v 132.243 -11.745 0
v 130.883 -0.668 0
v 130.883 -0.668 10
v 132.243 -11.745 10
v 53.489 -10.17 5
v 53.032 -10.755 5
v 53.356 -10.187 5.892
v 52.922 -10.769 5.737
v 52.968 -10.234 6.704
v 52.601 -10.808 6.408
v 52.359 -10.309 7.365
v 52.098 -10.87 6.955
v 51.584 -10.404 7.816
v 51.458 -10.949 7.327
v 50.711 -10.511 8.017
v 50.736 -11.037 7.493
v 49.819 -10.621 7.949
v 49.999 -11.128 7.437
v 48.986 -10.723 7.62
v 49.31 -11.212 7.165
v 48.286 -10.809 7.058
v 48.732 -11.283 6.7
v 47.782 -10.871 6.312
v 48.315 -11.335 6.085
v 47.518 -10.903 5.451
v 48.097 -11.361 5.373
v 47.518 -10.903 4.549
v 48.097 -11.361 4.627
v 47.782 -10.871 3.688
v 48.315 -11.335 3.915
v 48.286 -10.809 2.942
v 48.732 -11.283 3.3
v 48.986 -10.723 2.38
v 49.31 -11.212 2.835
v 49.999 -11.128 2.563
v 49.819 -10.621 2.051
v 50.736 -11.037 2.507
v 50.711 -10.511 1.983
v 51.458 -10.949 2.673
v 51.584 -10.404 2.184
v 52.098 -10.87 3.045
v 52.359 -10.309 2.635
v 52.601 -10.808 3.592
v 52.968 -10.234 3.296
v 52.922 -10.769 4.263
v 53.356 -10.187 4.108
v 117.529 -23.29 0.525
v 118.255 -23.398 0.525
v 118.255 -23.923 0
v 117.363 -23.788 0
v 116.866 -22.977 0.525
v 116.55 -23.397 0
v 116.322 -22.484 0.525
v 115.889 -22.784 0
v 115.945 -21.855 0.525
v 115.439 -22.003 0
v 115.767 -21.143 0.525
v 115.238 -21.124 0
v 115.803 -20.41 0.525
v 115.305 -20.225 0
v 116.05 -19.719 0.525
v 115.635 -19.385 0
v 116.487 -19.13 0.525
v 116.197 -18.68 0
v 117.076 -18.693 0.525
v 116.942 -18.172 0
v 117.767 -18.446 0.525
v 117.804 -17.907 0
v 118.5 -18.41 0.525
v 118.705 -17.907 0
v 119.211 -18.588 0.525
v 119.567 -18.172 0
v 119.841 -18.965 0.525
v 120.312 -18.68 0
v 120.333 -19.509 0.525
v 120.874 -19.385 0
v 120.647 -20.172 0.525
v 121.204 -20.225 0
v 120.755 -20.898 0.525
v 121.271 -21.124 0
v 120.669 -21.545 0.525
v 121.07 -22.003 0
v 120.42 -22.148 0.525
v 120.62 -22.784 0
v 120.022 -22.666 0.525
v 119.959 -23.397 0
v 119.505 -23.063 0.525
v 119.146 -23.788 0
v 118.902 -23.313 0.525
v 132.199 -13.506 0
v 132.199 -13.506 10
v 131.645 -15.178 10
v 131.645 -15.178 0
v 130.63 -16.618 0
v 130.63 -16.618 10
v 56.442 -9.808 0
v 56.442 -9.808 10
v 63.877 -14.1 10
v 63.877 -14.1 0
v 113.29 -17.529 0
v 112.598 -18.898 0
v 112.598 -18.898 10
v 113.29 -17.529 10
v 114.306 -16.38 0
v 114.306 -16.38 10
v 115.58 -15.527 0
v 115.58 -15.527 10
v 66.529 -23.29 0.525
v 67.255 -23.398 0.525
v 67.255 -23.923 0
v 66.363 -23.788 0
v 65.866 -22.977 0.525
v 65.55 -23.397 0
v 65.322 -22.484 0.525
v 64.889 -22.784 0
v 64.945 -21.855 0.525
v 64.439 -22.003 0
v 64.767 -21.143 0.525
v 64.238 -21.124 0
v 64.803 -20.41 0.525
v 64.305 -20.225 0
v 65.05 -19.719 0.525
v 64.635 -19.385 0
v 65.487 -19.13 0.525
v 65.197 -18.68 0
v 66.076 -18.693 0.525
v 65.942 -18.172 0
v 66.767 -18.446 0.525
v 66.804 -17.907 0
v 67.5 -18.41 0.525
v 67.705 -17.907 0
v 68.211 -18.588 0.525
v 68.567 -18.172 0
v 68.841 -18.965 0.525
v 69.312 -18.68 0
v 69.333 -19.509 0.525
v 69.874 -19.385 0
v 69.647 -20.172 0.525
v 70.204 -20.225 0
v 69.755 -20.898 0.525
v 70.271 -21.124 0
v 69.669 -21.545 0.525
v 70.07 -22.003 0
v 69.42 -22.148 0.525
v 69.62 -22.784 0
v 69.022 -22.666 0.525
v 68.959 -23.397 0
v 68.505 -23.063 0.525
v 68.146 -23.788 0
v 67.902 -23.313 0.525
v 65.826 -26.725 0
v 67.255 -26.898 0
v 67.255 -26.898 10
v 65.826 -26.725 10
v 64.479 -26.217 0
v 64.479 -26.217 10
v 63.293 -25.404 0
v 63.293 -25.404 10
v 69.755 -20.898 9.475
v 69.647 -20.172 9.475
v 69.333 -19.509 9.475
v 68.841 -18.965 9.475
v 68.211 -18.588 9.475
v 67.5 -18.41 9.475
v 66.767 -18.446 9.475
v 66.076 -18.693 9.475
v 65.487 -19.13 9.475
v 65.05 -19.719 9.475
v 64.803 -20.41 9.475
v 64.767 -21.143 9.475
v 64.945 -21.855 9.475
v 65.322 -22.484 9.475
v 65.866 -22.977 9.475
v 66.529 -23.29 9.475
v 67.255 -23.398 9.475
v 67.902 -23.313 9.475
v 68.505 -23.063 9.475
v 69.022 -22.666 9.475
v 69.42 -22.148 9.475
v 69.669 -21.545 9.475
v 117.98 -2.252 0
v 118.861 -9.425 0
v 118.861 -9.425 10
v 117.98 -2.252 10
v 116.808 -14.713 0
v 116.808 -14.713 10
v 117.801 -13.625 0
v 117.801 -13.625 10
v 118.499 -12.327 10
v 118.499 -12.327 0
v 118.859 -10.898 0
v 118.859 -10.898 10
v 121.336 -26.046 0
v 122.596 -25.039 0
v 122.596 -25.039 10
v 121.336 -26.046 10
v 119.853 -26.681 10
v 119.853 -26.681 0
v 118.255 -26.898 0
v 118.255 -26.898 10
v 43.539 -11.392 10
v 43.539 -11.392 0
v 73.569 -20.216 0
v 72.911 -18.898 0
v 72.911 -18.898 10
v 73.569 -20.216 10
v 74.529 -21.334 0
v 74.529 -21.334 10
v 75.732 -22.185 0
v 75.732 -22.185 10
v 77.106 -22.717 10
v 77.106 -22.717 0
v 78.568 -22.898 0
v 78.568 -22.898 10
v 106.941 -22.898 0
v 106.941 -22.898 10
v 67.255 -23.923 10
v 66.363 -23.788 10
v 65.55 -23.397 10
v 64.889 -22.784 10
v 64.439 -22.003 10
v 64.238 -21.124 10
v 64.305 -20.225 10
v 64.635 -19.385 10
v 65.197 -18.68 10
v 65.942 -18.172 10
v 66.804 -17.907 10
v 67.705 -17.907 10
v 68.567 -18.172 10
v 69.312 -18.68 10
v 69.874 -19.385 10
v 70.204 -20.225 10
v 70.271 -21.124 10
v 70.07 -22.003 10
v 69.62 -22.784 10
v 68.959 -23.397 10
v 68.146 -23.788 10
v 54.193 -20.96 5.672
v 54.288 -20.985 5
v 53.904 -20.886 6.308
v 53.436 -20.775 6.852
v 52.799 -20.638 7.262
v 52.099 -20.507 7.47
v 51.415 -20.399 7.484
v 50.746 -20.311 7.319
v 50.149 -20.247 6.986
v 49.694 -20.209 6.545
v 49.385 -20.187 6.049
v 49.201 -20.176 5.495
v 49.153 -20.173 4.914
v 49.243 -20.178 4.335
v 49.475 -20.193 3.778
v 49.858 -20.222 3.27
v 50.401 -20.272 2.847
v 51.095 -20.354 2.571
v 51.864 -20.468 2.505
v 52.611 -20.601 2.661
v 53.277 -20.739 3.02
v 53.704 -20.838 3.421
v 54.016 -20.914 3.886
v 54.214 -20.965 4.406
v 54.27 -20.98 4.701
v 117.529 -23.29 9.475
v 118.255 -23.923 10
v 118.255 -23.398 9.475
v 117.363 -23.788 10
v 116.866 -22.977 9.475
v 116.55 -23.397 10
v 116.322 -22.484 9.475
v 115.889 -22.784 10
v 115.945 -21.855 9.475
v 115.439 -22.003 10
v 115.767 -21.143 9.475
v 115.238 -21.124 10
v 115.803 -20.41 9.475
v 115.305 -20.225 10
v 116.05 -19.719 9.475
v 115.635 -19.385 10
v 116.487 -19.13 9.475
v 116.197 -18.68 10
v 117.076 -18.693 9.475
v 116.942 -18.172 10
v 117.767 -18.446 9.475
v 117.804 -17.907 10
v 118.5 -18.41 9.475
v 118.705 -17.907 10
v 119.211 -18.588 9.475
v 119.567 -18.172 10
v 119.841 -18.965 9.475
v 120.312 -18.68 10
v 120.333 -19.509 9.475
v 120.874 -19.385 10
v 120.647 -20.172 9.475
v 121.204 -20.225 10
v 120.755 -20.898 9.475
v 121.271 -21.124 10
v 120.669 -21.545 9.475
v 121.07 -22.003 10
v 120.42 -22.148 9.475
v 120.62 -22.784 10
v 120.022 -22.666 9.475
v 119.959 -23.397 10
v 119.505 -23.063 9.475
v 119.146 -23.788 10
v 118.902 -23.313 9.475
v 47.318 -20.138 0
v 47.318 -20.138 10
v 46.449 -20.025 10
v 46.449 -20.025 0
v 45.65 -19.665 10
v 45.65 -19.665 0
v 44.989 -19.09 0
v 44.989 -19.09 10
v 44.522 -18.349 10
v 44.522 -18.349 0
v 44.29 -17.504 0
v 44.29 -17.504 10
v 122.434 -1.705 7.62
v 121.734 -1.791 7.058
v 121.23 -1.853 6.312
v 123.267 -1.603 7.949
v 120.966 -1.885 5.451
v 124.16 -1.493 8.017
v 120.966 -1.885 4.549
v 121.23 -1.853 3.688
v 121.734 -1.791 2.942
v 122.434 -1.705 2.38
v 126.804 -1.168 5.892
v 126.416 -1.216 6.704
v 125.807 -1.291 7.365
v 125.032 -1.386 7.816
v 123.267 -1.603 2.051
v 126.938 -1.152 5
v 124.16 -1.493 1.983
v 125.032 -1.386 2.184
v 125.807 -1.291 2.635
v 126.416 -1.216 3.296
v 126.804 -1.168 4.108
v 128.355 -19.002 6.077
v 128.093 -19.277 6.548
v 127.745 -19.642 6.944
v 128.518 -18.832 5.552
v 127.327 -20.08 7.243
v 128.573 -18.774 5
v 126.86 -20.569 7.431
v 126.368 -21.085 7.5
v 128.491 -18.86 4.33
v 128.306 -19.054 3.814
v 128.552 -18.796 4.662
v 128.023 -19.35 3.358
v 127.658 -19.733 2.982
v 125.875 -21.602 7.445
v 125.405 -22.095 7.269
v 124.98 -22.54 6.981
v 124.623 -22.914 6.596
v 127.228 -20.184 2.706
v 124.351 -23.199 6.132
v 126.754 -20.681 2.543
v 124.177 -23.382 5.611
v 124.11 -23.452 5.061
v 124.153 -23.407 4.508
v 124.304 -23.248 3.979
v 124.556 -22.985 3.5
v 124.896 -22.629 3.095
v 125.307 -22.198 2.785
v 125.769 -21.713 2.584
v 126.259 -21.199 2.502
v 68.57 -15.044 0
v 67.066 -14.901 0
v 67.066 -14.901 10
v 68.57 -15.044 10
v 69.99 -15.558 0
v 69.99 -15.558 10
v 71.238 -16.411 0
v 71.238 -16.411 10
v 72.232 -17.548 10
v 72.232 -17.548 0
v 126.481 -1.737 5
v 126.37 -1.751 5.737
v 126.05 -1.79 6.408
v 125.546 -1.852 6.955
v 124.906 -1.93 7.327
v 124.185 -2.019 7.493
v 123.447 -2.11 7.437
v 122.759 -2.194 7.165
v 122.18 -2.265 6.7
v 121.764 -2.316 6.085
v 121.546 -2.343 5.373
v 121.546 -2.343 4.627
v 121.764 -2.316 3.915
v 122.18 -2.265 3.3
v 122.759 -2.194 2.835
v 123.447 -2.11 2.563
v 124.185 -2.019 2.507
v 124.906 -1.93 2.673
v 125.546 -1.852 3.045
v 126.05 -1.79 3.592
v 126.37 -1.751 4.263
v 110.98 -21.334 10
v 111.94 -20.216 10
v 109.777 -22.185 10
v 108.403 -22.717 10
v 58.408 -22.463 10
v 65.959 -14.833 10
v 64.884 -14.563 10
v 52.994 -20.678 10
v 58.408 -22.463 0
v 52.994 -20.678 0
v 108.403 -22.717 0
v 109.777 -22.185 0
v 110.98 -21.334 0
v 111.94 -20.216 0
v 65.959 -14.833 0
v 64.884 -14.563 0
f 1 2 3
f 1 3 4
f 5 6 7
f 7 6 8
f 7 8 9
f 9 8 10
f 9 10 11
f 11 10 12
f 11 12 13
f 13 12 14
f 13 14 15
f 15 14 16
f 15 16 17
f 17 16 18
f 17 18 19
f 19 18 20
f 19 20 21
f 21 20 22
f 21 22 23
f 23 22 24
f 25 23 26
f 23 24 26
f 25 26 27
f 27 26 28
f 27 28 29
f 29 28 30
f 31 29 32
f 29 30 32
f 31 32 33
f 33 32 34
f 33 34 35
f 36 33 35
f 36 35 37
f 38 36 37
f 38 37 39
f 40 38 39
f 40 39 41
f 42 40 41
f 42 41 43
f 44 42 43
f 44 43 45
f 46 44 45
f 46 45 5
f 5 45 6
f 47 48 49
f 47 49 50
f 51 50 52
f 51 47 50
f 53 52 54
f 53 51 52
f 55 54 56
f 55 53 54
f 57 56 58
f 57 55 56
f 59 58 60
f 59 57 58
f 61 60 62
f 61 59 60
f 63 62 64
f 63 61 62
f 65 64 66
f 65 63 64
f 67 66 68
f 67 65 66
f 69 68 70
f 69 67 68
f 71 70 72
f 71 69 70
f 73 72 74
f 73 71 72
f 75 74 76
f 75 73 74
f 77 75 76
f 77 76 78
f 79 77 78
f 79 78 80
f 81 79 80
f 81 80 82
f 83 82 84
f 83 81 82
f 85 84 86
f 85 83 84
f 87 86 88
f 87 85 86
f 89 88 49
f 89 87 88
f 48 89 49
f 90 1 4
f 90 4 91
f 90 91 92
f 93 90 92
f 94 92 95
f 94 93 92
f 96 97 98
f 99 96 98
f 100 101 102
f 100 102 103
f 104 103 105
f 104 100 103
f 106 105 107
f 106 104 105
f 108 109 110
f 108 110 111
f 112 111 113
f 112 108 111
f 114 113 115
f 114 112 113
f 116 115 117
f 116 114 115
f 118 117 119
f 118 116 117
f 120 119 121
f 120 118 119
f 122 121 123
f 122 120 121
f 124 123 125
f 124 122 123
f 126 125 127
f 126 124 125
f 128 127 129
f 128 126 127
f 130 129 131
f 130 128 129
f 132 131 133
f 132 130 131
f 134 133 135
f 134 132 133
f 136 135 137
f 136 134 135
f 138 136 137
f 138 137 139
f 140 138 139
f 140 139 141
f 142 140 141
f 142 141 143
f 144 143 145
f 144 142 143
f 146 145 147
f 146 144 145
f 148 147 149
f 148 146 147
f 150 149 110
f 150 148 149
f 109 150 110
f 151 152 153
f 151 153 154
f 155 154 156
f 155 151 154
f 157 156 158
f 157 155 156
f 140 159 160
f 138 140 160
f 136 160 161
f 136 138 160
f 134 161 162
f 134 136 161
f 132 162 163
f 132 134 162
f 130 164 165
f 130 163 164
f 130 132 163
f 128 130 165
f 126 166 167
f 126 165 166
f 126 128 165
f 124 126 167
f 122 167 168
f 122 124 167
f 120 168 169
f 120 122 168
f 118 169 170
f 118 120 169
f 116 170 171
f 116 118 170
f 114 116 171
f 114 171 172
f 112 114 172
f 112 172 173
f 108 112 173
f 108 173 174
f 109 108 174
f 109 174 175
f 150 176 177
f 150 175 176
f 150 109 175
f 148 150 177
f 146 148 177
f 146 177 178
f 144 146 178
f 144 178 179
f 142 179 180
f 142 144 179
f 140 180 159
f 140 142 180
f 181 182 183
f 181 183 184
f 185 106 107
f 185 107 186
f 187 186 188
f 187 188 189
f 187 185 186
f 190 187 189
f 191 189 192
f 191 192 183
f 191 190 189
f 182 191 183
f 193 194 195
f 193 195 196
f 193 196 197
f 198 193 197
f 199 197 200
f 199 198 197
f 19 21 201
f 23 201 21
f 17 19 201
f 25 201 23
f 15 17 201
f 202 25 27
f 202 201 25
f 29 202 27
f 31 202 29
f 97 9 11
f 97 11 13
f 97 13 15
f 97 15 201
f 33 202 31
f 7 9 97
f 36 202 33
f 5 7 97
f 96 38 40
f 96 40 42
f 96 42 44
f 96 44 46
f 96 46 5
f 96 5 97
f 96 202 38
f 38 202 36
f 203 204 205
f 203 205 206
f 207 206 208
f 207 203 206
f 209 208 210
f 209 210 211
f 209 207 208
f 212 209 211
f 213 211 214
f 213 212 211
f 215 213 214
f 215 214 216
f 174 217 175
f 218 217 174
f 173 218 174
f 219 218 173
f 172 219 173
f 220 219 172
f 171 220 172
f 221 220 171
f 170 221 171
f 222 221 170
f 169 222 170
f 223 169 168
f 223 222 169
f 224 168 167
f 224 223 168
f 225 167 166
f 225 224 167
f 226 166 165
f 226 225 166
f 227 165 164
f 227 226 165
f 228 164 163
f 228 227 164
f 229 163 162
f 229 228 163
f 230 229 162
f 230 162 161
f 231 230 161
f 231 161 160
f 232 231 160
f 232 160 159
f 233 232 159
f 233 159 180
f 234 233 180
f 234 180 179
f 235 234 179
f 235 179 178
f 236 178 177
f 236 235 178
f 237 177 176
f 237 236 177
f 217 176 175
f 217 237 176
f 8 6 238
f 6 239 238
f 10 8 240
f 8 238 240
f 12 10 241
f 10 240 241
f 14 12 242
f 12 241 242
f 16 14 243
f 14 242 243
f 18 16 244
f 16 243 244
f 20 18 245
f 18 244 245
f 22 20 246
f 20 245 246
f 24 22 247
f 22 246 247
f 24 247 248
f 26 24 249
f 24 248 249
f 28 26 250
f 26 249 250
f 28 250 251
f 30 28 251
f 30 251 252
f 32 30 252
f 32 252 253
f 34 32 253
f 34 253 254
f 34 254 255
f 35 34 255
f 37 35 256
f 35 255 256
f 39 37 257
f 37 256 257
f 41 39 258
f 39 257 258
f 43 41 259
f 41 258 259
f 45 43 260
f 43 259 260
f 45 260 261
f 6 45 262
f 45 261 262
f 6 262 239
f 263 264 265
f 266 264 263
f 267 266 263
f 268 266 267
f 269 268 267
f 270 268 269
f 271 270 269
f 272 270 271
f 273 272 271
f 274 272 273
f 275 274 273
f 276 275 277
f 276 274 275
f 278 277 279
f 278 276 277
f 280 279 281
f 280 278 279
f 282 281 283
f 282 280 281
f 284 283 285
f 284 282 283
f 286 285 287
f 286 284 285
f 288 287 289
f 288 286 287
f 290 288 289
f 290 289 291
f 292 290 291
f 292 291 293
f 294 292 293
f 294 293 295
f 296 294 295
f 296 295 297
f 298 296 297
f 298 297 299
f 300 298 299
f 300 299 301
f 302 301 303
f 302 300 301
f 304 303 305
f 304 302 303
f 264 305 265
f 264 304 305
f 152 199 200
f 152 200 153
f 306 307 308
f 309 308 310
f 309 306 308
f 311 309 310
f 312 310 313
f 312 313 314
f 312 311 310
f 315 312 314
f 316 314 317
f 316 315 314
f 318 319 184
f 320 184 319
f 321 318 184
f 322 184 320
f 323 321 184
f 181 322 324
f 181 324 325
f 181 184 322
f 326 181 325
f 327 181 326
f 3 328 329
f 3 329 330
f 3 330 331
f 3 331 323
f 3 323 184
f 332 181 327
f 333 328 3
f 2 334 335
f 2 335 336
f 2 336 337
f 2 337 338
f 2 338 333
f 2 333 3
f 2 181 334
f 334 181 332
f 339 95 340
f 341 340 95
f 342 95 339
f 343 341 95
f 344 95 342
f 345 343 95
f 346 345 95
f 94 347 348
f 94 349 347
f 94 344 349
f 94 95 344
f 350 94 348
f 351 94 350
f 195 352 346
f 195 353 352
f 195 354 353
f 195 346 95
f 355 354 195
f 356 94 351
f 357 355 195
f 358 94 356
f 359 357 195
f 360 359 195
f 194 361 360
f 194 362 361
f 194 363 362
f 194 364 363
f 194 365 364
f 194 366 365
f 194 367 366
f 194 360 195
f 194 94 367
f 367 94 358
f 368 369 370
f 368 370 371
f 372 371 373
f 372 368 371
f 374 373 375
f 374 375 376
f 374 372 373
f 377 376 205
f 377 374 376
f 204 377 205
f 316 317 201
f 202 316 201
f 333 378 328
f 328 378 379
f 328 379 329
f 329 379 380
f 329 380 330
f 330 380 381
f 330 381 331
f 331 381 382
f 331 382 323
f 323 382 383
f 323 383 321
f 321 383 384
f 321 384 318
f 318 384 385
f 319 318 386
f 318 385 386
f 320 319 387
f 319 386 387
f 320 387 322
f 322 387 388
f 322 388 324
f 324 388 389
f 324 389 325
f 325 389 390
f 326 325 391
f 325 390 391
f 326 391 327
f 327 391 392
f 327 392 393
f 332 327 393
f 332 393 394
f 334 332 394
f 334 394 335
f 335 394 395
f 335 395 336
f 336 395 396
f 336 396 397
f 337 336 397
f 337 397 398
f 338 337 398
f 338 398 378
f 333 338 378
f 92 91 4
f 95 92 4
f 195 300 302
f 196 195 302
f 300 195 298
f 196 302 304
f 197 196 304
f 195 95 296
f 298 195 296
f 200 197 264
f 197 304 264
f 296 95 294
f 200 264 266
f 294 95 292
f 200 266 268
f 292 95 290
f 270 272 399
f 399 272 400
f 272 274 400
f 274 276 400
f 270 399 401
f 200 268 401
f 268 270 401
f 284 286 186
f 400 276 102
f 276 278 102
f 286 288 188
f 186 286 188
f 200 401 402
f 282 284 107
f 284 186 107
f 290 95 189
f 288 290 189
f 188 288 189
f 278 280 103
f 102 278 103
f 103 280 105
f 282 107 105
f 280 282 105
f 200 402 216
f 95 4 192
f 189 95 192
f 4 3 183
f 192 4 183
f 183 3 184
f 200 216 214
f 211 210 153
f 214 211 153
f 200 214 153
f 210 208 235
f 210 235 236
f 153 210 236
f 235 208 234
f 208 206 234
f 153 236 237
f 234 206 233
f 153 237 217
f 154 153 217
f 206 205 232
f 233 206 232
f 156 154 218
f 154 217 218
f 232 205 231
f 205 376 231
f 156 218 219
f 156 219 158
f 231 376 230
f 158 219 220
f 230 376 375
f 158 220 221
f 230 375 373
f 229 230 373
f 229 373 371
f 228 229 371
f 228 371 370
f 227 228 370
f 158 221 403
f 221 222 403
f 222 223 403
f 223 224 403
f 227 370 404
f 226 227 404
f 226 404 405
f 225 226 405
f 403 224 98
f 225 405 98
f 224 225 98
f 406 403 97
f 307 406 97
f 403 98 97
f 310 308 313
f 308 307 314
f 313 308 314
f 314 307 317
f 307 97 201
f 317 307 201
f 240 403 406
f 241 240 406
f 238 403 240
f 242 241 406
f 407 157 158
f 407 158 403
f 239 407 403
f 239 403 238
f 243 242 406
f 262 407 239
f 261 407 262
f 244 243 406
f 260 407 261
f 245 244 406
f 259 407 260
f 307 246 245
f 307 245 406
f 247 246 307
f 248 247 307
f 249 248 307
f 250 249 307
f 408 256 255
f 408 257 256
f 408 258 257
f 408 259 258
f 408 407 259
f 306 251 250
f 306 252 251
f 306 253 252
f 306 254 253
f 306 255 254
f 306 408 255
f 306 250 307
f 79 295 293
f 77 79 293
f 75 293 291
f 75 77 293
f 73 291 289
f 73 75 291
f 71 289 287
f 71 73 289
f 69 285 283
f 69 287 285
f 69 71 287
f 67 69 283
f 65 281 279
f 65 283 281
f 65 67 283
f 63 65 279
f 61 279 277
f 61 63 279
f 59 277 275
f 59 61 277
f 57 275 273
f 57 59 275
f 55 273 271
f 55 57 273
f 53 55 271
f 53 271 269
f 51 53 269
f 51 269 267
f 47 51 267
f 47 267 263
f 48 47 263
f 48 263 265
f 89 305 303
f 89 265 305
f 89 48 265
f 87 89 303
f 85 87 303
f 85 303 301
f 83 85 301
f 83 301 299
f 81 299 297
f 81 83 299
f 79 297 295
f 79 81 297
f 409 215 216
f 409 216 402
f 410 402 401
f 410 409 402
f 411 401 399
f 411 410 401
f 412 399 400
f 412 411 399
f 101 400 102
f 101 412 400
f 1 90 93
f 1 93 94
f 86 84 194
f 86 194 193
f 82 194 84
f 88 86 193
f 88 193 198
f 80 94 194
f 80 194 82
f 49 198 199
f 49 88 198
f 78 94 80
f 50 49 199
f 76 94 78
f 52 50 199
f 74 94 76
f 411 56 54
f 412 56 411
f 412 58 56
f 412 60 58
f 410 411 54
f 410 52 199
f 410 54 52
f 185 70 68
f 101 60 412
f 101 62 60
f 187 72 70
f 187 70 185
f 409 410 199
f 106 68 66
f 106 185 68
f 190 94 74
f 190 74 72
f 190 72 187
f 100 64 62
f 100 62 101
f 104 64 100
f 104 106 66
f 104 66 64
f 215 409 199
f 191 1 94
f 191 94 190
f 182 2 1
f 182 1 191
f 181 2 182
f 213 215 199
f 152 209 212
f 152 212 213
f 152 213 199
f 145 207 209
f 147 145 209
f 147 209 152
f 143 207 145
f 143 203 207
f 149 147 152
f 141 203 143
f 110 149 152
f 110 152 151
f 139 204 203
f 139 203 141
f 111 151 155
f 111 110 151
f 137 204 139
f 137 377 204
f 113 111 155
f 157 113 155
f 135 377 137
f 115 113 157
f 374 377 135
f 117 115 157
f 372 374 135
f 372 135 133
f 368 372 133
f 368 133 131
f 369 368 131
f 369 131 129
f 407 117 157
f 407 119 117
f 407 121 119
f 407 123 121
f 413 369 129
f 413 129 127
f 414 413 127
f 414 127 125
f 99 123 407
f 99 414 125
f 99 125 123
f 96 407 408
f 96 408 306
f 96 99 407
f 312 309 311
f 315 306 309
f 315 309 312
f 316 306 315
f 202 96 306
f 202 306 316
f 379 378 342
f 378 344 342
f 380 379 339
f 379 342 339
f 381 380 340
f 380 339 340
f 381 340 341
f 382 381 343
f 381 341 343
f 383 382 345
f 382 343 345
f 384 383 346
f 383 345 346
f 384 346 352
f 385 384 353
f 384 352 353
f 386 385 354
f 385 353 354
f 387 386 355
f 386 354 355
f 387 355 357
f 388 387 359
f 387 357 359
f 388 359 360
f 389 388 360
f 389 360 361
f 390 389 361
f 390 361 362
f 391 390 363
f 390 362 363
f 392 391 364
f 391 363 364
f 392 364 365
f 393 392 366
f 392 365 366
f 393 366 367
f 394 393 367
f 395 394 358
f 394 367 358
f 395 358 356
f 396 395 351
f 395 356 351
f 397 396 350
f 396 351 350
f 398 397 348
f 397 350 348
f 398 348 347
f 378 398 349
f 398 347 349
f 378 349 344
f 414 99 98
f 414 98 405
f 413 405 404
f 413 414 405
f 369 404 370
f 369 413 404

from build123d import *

# Parameters (mm, degrees)
SKETCH_1_R                  = 2.5
EXTRUDE_1_DEPTH             = 10
HOLE_WIZARD_M61_AT_2_COUNT  = 2
HOLE_WIZARD_M61_AT_2_PITCH  = 51
HOLE_WIZARD_M62_D           = 5
HOLE_WIZARD_M62_CSINK_D     = 6.05
HOLE_WIZARD_M62_CSINK_ANGLE = 90


with BuildPart() as part:
    # Эскиз1 → Бобышка-Вытянуть1 (new body)
    with BuildSketch(Plane.XY):
        with BuildLine():
            Line((130.883213409, -0.667537052), (132.243357005, -11.745017689))
            ThreePointArc((132.243357005, -11.745017689), (131.983826113, -14.362626415), (130.629567818, -16.617668809))
            Line((130.629567818, -16.617668809), (122.596022679, -25.039275591))
            ThreePointArc((122.596022679, -25.039275591), (120.615825879, -26.413663696), (118.254534957, -26.897840532))
            Line((118.254534957, -26.897840532), (67.254534957, -26.897840532))
            ThreePointArc((67.254534957, -26.897840532), (65.137379079, -26.511898867), (63.292589424, -25.403724196))
            ThreePointArc((63.292589424, -25.403724196), (55.75092202, -21.419041585), (47.318028666, -20.138123004))
            ThreePointArc((47.318028666, -20.138123004), (45.29848634, -19.402158499), (44.289626193, -17.504160563))
            Line((44.289626193, -17.504160563), (43.539152064, -11.392039271))
            Line((43.539152064, -11.392039271), (56.442252036, -9.807737807))
            Line((56.442252036, -9.807737807), (63.876575818, -14.099946644))
            ThreePointArc((63.876575818, -14.099946644), (65.415135622, -14.723089071), (67.065555387, -14.900817376))
            ThreePointArc((67.065555387, -14.900817376), (70.641046717, -15.944908259), (72.911389206, -18.897840532))
            ThreePointArc((72.911389206, -18.897840532), (75.10414184, -21.796820017), (78.568243456, -22.897840532))
            Line((78.568243456, -22.897840532), (106.940826458, -22.897840532))
            ThreePointArc((106.940826458, -22.897840532), (110.404928073, -21.796820017), (112.597680707, -18.897840532))
            ThreePointArc((112.597680707, -18.897840532), (113.760800632, -16.922120242), (115.58004554, -15.526890303))
            ThreePointArc((115.58004554, -15.526890303), (118.190187148, -12.997185387), (118.860833034, -9.424724013))
            Line((118.860833034, -9.424724013), (117.980113437, -2.251838516))
            Line((117.980113437, -2.251838516), (130.883213409, -0.667537052))
        make_face()
        with Locations((67.254534957, -20.897840532)):
            Circle(SKETCH_1_R, mode=Mode.SUBTRACT)
        with Locations((118.254534957, -20.897840532)):
            Circle(SKETCH_1_R, mode=Mode.SUBTRACT)
    extrude(amount=EXTRUDE_1_DEPTH)

    # Эскиз2 → Отверстие обработанное метчиком M61 (revolve, cut)
    with BuildSketch(Plane(origin=(67.254534957, -20.897840532, 10), x_dir=(0, -1, 0), z_dir=(1, 0, 0))):
        Polygon((0, 0), (0, 10), (3.025, 10), (2.5, 9.475), (2.5, 0.525), (3.025, 0), align=None)
    hole_wizard_m61 = revolve(axis=Axis((67.254534957, -20.897840532, 16.35), (0, 0, -1)), mode=Mode.SUBTRACT)

    # Отверстие обработанное метчиком M61 at 2: Отверстие обработанное метчиком M61 ×2
    with Locations(*[(i * HOLE_WIZARD_M61_AT_2_PITCH, 0, 0) for i in range(1, HOLE_WIZARD_M61_AT_2_COUNT)]):
        add(hole_wizard_m61, mode=Mode.SUBTRACT)

    # Отверстие обработанное метчиком M62 (through all)
    with Locations(Plane(origin=(2.024641313, -16.489380245, 0), x_dir=(-0.992546151641322, -0.12186934340514836, 0), z_dir=(-0.12186934340514835, 0.9925461516413219, 0))):
        with Locations((-48.826277481, 5), (-122.826277481, 5)):
            CounterSinkHole(HOLE_WIZARD_M62_D / 2, HOLE_WIZARD_M62_CSINK_D / 2, counter_sink_angle=HOLE_WIZARD_M62_CSINK_ANGLE)


solid = part.part
